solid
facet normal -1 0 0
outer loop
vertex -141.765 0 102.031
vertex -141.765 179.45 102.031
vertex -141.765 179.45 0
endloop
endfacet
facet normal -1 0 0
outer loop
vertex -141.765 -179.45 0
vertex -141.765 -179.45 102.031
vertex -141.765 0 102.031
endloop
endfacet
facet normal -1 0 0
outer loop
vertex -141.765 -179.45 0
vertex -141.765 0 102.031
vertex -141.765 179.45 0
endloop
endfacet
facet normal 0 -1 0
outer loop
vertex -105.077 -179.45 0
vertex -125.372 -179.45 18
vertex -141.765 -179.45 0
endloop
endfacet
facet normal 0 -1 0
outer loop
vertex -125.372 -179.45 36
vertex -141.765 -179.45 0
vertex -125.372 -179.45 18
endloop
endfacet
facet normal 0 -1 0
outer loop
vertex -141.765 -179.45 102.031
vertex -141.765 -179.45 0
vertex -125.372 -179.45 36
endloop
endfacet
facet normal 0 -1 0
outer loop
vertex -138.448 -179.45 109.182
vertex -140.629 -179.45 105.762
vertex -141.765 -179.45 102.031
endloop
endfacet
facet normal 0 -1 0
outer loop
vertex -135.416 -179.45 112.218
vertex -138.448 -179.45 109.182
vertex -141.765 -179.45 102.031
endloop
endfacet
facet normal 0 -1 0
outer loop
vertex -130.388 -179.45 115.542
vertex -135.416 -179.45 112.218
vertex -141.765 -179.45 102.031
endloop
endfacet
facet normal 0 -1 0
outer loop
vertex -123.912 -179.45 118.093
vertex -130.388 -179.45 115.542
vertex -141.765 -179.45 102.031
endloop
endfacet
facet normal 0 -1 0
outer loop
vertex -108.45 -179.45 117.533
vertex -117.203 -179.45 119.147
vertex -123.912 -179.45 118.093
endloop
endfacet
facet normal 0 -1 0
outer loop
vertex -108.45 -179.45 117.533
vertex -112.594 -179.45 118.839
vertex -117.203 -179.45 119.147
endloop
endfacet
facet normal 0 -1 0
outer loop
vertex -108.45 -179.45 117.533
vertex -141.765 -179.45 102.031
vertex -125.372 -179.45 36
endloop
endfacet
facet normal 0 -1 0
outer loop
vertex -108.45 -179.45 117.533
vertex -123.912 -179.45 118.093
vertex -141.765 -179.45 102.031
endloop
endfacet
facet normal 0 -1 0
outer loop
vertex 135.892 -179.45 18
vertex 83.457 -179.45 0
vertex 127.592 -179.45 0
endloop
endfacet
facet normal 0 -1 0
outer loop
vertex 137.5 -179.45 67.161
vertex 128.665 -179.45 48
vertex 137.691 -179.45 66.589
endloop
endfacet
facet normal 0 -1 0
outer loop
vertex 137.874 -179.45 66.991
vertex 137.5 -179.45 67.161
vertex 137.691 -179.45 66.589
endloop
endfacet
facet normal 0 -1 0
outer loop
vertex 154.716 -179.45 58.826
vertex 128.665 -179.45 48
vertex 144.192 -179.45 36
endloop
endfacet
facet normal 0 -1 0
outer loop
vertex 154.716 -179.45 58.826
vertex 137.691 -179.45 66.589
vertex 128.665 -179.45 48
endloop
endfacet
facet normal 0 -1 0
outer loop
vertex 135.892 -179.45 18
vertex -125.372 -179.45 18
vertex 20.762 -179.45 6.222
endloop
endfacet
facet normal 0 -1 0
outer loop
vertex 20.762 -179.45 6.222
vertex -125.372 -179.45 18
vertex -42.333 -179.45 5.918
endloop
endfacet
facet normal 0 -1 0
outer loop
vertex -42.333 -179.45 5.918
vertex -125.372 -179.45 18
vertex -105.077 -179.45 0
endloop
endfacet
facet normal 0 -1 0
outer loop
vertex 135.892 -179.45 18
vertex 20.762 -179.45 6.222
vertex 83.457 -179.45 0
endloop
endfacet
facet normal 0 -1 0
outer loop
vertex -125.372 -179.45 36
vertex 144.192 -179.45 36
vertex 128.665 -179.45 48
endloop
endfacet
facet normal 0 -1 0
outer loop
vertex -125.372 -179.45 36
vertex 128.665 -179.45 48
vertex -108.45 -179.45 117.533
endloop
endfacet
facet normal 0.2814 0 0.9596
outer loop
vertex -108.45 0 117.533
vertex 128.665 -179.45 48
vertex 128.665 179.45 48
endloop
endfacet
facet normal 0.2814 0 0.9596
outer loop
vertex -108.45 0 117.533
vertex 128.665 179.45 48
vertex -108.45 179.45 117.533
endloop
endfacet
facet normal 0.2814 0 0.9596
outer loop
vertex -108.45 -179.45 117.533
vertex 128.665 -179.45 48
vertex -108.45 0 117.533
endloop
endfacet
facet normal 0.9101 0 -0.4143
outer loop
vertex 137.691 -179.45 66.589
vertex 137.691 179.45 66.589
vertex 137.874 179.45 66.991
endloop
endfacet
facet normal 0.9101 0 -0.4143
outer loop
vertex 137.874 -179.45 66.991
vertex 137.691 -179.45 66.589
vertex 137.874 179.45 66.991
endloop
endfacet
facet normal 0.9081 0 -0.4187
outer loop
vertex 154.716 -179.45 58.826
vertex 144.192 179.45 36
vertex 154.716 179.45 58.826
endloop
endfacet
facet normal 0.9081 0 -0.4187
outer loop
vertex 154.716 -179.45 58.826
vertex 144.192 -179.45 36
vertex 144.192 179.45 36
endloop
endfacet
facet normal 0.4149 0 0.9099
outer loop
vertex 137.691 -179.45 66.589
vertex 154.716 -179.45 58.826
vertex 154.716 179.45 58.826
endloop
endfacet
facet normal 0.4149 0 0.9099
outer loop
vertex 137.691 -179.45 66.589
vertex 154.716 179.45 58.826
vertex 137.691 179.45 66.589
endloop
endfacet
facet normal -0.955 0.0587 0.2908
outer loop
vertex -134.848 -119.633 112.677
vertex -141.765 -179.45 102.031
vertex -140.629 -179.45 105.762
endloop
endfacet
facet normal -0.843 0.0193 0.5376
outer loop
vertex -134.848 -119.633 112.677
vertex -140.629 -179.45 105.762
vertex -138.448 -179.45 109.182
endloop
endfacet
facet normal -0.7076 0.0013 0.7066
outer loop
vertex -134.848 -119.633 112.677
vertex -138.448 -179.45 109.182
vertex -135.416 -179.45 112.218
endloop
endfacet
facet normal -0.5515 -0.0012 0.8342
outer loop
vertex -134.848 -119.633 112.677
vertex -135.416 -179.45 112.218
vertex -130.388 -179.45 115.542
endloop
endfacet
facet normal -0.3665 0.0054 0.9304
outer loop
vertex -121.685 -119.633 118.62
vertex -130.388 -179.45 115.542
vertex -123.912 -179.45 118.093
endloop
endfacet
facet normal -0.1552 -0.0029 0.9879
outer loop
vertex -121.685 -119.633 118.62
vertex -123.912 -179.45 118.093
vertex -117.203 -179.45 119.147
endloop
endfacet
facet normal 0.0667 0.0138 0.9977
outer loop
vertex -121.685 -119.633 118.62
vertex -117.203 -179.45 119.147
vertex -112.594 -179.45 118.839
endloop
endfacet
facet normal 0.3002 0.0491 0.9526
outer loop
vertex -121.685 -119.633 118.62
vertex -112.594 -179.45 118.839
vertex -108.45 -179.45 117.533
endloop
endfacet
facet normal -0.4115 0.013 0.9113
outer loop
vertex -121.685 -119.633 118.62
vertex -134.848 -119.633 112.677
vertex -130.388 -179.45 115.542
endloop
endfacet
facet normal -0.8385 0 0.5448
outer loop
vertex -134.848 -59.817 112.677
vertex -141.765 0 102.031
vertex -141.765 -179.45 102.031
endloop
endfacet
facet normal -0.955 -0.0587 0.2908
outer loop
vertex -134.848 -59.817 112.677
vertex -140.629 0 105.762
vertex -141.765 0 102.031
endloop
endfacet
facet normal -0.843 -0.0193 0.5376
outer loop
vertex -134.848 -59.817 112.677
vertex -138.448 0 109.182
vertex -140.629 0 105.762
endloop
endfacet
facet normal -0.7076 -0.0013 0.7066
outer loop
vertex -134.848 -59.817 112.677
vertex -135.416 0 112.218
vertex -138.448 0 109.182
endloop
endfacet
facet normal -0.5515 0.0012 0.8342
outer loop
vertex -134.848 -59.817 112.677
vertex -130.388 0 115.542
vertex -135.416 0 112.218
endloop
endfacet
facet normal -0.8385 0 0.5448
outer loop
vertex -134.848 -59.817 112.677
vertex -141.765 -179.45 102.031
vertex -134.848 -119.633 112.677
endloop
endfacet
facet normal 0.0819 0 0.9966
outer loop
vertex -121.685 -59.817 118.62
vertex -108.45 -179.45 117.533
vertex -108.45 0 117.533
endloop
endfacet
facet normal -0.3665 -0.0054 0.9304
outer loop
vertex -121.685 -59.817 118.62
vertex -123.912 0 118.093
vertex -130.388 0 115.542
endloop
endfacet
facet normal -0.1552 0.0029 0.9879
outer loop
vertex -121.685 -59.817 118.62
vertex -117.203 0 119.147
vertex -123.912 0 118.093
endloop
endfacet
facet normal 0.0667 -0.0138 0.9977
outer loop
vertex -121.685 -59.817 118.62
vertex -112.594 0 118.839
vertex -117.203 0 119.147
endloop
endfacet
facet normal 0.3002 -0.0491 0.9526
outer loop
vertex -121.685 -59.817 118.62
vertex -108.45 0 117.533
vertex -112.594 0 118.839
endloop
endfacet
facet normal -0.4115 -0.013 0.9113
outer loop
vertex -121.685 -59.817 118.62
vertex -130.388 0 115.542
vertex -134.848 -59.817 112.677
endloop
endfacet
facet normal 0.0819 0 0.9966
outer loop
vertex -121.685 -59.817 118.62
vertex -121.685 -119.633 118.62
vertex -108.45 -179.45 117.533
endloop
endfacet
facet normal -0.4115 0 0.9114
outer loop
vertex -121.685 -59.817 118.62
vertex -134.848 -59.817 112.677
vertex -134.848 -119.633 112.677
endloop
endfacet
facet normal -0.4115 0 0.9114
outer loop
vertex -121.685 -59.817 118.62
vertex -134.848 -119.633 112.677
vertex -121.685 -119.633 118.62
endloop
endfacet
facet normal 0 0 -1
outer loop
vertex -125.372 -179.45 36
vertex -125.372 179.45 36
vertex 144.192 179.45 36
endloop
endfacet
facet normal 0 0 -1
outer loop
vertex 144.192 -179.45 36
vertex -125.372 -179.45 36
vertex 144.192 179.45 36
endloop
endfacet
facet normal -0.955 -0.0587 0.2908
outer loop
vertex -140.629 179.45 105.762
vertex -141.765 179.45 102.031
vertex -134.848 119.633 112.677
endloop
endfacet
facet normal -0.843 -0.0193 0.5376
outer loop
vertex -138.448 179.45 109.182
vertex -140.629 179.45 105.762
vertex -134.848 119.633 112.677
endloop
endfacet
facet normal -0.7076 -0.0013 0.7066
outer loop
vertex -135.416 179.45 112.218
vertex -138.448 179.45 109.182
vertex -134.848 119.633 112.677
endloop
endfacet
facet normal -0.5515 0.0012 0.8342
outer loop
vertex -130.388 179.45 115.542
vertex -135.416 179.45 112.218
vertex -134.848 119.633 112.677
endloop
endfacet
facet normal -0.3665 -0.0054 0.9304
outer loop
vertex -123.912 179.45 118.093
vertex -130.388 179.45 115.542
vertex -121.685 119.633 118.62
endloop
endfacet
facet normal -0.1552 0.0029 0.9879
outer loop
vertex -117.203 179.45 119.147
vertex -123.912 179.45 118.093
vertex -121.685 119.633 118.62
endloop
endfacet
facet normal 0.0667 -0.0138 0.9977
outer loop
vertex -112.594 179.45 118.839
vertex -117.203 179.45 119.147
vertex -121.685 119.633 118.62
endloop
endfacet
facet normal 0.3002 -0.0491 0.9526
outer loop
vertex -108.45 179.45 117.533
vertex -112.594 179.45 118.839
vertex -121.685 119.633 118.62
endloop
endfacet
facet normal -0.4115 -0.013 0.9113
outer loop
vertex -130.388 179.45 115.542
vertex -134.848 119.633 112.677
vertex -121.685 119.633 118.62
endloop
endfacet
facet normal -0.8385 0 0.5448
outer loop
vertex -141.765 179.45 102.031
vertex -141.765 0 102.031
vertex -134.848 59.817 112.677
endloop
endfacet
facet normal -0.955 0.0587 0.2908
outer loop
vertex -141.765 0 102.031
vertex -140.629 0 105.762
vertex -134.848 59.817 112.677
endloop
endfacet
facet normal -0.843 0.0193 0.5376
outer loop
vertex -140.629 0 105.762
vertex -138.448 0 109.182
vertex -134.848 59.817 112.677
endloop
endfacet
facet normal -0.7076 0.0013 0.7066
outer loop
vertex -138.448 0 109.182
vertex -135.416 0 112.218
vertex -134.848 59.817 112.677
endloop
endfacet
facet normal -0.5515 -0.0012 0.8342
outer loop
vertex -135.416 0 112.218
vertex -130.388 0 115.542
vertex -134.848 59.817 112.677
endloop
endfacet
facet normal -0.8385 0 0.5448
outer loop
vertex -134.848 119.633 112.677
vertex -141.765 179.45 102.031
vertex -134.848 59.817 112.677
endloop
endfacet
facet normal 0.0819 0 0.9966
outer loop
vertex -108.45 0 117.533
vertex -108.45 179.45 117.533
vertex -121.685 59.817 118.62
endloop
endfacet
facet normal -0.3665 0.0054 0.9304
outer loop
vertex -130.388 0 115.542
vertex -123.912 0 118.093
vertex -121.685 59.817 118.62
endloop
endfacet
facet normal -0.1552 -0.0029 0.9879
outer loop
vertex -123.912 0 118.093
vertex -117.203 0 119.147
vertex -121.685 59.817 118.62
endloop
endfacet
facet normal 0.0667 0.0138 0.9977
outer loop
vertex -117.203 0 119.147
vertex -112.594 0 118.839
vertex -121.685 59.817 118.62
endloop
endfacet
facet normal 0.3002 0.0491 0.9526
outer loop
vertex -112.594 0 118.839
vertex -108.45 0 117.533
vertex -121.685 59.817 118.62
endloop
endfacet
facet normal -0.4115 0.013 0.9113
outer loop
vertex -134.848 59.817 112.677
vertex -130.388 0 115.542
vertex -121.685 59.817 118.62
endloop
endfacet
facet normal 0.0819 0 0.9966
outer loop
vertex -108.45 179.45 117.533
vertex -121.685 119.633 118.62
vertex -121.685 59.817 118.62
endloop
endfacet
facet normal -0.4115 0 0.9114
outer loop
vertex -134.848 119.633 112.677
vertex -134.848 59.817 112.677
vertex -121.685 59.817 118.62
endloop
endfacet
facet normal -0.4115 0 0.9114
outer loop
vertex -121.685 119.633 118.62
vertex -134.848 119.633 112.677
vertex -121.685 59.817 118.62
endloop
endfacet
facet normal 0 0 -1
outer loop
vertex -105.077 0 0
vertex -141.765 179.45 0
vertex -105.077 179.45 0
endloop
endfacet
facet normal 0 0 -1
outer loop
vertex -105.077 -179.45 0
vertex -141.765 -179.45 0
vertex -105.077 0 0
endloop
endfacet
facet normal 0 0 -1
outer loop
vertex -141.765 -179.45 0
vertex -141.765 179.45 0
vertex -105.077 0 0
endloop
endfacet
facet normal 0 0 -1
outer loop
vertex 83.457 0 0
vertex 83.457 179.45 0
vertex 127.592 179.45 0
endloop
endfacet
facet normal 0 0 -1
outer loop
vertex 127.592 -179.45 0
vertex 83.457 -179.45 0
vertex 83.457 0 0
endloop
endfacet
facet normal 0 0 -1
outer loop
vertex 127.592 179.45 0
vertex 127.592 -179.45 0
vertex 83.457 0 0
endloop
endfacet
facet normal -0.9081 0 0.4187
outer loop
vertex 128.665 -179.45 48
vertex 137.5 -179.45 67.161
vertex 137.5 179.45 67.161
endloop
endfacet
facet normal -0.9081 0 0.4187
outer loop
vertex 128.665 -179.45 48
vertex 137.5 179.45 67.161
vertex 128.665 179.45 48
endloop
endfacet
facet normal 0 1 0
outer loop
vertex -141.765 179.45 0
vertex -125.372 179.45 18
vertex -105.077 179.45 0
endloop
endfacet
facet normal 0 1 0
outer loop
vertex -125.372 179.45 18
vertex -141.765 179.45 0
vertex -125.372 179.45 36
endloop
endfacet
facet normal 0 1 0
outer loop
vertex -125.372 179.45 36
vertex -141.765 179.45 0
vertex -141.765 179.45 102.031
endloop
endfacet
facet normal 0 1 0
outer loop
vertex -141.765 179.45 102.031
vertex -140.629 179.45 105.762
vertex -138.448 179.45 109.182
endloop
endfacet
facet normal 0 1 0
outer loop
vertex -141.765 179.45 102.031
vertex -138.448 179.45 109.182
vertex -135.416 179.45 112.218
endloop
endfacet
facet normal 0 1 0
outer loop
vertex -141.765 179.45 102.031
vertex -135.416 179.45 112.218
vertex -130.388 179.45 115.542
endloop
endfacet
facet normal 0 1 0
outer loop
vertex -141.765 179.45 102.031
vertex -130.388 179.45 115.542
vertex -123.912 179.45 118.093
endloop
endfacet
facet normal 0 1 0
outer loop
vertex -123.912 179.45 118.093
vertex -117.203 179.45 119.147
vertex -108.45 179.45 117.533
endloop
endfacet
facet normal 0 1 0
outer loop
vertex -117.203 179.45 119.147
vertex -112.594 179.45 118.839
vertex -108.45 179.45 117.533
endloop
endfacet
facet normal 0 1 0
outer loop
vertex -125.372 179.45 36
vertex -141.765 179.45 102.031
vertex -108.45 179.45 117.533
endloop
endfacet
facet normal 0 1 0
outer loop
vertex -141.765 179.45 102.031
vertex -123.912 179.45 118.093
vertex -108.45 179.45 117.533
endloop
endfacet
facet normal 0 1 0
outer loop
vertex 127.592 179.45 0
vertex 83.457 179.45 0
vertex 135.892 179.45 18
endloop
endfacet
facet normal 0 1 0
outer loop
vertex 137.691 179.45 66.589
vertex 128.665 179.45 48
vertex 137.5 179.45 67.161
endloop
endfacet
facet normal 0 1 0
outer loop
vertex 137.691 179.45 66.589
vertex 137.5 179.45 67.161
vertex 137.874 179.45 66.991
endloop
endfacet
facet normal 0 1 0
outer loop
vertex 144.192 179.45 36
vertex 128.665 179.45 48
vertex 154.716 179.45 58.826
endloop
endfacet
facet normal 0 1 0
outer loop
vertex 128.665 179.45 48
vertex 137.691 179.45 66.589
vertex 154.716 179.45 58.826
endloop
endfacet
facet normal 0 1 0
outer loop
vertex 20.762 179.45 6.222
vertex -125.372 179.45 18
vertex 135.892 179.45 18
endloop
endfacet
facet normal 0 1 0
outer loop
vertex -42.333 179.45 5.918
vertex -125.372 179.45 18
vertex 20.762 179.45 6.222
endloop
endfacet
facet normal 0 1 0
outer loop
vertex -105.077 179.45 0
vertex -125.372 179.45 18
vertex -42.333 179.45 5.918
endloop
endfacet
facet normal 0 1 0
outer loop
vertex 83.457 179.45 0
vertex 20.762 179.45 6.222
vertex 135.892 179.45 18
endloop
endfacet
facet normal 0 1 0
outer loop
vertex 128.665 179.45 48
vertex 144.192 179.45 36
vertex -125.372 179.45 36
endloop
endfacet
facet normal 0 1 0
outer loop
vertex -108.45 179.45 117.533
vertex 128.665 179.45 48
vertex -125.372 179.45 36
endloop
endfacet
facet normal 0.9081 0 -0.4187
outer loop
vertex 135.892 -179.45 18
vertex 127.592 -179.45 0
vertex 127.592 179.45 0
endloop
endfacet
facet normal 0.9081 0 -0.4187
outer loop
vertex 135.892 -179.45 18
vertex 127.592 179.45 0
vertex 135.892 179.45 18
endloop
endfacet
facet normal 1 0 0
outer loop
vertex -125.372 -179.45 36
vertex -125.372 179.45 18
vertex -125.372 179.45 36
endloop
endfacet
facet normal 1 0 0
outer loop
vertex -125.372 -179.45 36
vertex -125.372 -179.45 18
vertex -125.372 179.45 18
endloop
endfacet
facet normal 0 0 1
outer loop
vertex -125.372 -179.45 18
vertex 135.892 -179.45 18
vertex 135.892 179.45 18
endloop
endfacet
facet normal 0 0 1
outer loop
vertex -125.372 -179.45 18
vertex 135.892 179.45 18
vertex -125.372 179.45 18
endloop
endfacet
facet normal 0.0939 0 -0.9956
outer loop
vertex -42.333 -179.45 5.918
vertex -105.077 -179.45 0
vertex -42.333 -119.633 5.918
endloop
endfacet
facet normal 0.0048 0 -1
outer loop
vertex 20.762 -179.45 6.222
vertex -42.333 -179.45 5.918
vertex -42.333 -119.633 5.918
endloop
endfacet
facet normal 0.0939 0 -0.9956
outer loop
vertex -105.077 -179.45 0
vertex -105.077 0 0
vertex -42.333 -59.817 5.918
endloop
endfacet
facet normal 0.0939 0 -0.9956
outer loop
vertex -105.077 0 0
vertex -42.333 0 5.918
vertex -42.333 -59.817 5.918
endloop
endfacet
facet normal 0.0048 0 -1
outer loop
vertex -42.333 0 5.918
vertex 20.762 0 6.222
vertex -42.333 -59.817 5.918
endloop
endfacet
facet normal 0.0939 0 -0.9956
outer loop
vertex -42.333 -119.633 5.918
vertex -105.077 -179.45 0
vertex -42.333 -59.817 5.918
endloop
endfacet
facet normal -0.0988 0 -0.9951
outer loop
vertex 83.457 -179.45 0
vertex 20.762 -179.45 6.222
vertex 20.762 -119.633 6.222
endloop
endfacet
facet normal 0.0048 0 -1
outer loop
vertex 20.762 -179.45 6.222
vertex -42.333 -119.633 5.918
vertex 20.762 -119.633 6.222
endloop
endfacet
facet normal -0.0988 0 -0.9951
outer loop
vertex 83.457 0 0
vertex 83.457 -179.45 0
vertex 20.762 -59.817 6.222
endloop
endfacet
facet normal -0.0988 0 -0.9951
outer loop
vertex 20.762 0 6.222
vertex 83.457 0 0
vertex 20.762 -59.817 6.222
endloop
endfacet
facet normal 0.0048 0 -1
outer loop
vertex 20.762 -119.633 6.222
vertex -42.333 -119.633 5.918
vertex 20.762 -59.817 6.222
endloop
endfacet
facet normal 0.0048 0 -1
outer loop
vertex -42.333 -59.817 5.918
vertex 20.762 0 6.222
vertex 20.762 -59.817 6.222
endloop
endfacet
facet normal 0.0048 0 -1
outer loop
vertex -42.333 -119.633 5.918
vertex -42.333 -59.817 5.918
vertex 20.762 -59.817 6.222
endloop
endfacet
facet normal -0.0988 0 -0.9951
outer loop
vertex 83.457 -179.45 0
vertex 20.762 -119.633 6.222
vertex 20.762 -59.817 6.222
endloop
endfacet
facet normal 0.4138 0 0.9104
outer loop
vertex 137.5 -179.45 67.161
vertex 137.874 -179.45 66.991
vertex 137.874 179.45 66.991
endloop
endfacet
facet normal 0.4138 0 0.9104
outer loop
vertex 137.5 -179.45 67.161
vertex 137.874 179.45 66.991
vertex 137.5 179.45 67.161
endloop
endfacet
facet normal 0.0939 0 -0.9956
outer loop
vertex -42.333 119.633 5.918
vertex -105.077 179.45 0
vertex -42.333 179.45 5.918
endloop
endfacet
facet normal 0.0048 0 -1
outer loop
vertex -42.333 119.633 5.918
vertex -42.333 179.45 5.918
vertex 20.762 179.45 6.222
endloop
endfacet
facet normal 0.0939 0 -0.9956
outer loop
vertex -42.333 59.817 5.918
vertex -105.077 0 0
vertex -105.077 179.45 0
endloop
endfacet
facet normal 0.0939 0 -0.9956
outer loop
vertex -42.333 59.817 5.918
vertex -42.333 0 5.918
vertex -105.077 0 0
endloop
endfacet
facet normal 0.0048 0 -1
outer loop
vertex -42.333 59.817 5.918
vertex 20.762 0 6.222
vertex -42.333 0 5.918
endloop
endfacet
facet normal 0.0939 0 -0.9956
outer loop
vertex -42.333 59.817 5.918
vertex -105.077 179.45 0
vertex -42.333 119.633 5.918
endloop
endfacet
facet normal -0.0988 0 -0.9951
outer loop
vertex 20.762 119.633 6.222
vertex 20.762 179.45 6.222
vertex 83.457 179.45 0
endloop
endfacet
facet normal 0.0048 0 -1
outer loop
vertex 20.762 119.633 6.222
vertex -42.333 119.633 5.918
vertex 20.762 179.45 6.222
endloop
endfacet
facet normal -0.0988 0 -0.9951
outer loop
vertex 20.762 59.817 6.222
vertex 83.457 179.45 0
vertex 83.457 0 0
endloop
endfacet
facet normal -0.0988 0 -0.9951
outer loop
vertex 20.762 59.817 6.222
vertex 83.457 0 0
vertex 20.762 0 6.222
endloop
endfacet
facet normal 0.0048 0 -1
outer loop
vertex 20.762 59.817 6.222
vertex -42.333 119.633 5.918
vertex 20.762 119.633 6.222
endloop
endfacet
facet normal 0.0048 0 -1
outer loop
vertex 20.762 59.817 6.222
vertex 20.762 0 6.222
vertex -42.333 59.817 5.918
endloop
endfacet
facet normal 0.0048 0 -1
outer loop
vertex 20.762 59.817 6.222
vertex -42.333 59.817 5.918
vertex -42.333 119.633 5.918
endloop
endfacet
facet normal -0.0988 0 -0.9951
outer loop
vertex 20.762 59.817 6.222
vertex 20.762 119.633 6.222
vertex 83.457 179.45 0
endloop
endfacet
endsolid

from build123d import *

# Parameters (mm, degrees)
F0_W     = 16.392636
F0_H     = 18
F1_DEPTH = 179.45


with BuildPart() as f1:
    # F0 (on Front) → F1 (new body, symmetric)
    with BuildSketch(Plane.XZ):
        with BuildLine():
            Line((-125.372112, 36), (144.191556, 36))
            Line((144.191556, 36), (154.716455, 58.825539))
            Line((154.716455, 58.825539), (137.690631, 66.589023))
            Line((137.690631, 66.589023), (137.873941, 66.991033))
            Line((137.873941, 66.991033), (137.500362, 67.161379))
            Line((137.500362, 67.161379), (128.665014, 48))
            Line((128.665014, 48), (-108.450002, 117.533296))
            add(Edge.make_bspline(
                [(-141.764748, 102.030654), (-140.029642, 114.253703), (-119.663181, 122.909447), (-108.450002, 117.533296)],
                knots=[0, 0, 0, 0, 36.745125, 36.745125, 36.745125, 36.745125], degree=3))
            Line((-141.764748, 102.030654), (-141.764748, 36))
            Line((-141.764748, 36), (-125.372112, 36))
        make_face()
        with BuildLine():
            add(Edge.make_bspline(
                [(-105.076713, 0), (-42.760202, 8.42147), (21.213201, 9.788831), (83.456889, 0)],
                knots=[0, 0, 0, 0, 188.533601, 188.533601, 188.533601, 188.533601], degree=3))
            Line((83.456889, 0), (127.591888, 0))
            Line((127.591888, 0), (135.891722, 18))
            Line((135.891722, 18), (-125.372112, 18))
            Line((-125.372112, 18), (-141.764748, 18))
            Line((-141.764748, 18), (-141.764748, 0))
            Line((-141.764748, 0), (-105.076713, 0))
        make_face()
        with Locations((-133.56843, 27)):
            Rectangle(F0_W, F0_H)
    extrude(amount=F1_DEPTH, both=True)


solid = f1.part
